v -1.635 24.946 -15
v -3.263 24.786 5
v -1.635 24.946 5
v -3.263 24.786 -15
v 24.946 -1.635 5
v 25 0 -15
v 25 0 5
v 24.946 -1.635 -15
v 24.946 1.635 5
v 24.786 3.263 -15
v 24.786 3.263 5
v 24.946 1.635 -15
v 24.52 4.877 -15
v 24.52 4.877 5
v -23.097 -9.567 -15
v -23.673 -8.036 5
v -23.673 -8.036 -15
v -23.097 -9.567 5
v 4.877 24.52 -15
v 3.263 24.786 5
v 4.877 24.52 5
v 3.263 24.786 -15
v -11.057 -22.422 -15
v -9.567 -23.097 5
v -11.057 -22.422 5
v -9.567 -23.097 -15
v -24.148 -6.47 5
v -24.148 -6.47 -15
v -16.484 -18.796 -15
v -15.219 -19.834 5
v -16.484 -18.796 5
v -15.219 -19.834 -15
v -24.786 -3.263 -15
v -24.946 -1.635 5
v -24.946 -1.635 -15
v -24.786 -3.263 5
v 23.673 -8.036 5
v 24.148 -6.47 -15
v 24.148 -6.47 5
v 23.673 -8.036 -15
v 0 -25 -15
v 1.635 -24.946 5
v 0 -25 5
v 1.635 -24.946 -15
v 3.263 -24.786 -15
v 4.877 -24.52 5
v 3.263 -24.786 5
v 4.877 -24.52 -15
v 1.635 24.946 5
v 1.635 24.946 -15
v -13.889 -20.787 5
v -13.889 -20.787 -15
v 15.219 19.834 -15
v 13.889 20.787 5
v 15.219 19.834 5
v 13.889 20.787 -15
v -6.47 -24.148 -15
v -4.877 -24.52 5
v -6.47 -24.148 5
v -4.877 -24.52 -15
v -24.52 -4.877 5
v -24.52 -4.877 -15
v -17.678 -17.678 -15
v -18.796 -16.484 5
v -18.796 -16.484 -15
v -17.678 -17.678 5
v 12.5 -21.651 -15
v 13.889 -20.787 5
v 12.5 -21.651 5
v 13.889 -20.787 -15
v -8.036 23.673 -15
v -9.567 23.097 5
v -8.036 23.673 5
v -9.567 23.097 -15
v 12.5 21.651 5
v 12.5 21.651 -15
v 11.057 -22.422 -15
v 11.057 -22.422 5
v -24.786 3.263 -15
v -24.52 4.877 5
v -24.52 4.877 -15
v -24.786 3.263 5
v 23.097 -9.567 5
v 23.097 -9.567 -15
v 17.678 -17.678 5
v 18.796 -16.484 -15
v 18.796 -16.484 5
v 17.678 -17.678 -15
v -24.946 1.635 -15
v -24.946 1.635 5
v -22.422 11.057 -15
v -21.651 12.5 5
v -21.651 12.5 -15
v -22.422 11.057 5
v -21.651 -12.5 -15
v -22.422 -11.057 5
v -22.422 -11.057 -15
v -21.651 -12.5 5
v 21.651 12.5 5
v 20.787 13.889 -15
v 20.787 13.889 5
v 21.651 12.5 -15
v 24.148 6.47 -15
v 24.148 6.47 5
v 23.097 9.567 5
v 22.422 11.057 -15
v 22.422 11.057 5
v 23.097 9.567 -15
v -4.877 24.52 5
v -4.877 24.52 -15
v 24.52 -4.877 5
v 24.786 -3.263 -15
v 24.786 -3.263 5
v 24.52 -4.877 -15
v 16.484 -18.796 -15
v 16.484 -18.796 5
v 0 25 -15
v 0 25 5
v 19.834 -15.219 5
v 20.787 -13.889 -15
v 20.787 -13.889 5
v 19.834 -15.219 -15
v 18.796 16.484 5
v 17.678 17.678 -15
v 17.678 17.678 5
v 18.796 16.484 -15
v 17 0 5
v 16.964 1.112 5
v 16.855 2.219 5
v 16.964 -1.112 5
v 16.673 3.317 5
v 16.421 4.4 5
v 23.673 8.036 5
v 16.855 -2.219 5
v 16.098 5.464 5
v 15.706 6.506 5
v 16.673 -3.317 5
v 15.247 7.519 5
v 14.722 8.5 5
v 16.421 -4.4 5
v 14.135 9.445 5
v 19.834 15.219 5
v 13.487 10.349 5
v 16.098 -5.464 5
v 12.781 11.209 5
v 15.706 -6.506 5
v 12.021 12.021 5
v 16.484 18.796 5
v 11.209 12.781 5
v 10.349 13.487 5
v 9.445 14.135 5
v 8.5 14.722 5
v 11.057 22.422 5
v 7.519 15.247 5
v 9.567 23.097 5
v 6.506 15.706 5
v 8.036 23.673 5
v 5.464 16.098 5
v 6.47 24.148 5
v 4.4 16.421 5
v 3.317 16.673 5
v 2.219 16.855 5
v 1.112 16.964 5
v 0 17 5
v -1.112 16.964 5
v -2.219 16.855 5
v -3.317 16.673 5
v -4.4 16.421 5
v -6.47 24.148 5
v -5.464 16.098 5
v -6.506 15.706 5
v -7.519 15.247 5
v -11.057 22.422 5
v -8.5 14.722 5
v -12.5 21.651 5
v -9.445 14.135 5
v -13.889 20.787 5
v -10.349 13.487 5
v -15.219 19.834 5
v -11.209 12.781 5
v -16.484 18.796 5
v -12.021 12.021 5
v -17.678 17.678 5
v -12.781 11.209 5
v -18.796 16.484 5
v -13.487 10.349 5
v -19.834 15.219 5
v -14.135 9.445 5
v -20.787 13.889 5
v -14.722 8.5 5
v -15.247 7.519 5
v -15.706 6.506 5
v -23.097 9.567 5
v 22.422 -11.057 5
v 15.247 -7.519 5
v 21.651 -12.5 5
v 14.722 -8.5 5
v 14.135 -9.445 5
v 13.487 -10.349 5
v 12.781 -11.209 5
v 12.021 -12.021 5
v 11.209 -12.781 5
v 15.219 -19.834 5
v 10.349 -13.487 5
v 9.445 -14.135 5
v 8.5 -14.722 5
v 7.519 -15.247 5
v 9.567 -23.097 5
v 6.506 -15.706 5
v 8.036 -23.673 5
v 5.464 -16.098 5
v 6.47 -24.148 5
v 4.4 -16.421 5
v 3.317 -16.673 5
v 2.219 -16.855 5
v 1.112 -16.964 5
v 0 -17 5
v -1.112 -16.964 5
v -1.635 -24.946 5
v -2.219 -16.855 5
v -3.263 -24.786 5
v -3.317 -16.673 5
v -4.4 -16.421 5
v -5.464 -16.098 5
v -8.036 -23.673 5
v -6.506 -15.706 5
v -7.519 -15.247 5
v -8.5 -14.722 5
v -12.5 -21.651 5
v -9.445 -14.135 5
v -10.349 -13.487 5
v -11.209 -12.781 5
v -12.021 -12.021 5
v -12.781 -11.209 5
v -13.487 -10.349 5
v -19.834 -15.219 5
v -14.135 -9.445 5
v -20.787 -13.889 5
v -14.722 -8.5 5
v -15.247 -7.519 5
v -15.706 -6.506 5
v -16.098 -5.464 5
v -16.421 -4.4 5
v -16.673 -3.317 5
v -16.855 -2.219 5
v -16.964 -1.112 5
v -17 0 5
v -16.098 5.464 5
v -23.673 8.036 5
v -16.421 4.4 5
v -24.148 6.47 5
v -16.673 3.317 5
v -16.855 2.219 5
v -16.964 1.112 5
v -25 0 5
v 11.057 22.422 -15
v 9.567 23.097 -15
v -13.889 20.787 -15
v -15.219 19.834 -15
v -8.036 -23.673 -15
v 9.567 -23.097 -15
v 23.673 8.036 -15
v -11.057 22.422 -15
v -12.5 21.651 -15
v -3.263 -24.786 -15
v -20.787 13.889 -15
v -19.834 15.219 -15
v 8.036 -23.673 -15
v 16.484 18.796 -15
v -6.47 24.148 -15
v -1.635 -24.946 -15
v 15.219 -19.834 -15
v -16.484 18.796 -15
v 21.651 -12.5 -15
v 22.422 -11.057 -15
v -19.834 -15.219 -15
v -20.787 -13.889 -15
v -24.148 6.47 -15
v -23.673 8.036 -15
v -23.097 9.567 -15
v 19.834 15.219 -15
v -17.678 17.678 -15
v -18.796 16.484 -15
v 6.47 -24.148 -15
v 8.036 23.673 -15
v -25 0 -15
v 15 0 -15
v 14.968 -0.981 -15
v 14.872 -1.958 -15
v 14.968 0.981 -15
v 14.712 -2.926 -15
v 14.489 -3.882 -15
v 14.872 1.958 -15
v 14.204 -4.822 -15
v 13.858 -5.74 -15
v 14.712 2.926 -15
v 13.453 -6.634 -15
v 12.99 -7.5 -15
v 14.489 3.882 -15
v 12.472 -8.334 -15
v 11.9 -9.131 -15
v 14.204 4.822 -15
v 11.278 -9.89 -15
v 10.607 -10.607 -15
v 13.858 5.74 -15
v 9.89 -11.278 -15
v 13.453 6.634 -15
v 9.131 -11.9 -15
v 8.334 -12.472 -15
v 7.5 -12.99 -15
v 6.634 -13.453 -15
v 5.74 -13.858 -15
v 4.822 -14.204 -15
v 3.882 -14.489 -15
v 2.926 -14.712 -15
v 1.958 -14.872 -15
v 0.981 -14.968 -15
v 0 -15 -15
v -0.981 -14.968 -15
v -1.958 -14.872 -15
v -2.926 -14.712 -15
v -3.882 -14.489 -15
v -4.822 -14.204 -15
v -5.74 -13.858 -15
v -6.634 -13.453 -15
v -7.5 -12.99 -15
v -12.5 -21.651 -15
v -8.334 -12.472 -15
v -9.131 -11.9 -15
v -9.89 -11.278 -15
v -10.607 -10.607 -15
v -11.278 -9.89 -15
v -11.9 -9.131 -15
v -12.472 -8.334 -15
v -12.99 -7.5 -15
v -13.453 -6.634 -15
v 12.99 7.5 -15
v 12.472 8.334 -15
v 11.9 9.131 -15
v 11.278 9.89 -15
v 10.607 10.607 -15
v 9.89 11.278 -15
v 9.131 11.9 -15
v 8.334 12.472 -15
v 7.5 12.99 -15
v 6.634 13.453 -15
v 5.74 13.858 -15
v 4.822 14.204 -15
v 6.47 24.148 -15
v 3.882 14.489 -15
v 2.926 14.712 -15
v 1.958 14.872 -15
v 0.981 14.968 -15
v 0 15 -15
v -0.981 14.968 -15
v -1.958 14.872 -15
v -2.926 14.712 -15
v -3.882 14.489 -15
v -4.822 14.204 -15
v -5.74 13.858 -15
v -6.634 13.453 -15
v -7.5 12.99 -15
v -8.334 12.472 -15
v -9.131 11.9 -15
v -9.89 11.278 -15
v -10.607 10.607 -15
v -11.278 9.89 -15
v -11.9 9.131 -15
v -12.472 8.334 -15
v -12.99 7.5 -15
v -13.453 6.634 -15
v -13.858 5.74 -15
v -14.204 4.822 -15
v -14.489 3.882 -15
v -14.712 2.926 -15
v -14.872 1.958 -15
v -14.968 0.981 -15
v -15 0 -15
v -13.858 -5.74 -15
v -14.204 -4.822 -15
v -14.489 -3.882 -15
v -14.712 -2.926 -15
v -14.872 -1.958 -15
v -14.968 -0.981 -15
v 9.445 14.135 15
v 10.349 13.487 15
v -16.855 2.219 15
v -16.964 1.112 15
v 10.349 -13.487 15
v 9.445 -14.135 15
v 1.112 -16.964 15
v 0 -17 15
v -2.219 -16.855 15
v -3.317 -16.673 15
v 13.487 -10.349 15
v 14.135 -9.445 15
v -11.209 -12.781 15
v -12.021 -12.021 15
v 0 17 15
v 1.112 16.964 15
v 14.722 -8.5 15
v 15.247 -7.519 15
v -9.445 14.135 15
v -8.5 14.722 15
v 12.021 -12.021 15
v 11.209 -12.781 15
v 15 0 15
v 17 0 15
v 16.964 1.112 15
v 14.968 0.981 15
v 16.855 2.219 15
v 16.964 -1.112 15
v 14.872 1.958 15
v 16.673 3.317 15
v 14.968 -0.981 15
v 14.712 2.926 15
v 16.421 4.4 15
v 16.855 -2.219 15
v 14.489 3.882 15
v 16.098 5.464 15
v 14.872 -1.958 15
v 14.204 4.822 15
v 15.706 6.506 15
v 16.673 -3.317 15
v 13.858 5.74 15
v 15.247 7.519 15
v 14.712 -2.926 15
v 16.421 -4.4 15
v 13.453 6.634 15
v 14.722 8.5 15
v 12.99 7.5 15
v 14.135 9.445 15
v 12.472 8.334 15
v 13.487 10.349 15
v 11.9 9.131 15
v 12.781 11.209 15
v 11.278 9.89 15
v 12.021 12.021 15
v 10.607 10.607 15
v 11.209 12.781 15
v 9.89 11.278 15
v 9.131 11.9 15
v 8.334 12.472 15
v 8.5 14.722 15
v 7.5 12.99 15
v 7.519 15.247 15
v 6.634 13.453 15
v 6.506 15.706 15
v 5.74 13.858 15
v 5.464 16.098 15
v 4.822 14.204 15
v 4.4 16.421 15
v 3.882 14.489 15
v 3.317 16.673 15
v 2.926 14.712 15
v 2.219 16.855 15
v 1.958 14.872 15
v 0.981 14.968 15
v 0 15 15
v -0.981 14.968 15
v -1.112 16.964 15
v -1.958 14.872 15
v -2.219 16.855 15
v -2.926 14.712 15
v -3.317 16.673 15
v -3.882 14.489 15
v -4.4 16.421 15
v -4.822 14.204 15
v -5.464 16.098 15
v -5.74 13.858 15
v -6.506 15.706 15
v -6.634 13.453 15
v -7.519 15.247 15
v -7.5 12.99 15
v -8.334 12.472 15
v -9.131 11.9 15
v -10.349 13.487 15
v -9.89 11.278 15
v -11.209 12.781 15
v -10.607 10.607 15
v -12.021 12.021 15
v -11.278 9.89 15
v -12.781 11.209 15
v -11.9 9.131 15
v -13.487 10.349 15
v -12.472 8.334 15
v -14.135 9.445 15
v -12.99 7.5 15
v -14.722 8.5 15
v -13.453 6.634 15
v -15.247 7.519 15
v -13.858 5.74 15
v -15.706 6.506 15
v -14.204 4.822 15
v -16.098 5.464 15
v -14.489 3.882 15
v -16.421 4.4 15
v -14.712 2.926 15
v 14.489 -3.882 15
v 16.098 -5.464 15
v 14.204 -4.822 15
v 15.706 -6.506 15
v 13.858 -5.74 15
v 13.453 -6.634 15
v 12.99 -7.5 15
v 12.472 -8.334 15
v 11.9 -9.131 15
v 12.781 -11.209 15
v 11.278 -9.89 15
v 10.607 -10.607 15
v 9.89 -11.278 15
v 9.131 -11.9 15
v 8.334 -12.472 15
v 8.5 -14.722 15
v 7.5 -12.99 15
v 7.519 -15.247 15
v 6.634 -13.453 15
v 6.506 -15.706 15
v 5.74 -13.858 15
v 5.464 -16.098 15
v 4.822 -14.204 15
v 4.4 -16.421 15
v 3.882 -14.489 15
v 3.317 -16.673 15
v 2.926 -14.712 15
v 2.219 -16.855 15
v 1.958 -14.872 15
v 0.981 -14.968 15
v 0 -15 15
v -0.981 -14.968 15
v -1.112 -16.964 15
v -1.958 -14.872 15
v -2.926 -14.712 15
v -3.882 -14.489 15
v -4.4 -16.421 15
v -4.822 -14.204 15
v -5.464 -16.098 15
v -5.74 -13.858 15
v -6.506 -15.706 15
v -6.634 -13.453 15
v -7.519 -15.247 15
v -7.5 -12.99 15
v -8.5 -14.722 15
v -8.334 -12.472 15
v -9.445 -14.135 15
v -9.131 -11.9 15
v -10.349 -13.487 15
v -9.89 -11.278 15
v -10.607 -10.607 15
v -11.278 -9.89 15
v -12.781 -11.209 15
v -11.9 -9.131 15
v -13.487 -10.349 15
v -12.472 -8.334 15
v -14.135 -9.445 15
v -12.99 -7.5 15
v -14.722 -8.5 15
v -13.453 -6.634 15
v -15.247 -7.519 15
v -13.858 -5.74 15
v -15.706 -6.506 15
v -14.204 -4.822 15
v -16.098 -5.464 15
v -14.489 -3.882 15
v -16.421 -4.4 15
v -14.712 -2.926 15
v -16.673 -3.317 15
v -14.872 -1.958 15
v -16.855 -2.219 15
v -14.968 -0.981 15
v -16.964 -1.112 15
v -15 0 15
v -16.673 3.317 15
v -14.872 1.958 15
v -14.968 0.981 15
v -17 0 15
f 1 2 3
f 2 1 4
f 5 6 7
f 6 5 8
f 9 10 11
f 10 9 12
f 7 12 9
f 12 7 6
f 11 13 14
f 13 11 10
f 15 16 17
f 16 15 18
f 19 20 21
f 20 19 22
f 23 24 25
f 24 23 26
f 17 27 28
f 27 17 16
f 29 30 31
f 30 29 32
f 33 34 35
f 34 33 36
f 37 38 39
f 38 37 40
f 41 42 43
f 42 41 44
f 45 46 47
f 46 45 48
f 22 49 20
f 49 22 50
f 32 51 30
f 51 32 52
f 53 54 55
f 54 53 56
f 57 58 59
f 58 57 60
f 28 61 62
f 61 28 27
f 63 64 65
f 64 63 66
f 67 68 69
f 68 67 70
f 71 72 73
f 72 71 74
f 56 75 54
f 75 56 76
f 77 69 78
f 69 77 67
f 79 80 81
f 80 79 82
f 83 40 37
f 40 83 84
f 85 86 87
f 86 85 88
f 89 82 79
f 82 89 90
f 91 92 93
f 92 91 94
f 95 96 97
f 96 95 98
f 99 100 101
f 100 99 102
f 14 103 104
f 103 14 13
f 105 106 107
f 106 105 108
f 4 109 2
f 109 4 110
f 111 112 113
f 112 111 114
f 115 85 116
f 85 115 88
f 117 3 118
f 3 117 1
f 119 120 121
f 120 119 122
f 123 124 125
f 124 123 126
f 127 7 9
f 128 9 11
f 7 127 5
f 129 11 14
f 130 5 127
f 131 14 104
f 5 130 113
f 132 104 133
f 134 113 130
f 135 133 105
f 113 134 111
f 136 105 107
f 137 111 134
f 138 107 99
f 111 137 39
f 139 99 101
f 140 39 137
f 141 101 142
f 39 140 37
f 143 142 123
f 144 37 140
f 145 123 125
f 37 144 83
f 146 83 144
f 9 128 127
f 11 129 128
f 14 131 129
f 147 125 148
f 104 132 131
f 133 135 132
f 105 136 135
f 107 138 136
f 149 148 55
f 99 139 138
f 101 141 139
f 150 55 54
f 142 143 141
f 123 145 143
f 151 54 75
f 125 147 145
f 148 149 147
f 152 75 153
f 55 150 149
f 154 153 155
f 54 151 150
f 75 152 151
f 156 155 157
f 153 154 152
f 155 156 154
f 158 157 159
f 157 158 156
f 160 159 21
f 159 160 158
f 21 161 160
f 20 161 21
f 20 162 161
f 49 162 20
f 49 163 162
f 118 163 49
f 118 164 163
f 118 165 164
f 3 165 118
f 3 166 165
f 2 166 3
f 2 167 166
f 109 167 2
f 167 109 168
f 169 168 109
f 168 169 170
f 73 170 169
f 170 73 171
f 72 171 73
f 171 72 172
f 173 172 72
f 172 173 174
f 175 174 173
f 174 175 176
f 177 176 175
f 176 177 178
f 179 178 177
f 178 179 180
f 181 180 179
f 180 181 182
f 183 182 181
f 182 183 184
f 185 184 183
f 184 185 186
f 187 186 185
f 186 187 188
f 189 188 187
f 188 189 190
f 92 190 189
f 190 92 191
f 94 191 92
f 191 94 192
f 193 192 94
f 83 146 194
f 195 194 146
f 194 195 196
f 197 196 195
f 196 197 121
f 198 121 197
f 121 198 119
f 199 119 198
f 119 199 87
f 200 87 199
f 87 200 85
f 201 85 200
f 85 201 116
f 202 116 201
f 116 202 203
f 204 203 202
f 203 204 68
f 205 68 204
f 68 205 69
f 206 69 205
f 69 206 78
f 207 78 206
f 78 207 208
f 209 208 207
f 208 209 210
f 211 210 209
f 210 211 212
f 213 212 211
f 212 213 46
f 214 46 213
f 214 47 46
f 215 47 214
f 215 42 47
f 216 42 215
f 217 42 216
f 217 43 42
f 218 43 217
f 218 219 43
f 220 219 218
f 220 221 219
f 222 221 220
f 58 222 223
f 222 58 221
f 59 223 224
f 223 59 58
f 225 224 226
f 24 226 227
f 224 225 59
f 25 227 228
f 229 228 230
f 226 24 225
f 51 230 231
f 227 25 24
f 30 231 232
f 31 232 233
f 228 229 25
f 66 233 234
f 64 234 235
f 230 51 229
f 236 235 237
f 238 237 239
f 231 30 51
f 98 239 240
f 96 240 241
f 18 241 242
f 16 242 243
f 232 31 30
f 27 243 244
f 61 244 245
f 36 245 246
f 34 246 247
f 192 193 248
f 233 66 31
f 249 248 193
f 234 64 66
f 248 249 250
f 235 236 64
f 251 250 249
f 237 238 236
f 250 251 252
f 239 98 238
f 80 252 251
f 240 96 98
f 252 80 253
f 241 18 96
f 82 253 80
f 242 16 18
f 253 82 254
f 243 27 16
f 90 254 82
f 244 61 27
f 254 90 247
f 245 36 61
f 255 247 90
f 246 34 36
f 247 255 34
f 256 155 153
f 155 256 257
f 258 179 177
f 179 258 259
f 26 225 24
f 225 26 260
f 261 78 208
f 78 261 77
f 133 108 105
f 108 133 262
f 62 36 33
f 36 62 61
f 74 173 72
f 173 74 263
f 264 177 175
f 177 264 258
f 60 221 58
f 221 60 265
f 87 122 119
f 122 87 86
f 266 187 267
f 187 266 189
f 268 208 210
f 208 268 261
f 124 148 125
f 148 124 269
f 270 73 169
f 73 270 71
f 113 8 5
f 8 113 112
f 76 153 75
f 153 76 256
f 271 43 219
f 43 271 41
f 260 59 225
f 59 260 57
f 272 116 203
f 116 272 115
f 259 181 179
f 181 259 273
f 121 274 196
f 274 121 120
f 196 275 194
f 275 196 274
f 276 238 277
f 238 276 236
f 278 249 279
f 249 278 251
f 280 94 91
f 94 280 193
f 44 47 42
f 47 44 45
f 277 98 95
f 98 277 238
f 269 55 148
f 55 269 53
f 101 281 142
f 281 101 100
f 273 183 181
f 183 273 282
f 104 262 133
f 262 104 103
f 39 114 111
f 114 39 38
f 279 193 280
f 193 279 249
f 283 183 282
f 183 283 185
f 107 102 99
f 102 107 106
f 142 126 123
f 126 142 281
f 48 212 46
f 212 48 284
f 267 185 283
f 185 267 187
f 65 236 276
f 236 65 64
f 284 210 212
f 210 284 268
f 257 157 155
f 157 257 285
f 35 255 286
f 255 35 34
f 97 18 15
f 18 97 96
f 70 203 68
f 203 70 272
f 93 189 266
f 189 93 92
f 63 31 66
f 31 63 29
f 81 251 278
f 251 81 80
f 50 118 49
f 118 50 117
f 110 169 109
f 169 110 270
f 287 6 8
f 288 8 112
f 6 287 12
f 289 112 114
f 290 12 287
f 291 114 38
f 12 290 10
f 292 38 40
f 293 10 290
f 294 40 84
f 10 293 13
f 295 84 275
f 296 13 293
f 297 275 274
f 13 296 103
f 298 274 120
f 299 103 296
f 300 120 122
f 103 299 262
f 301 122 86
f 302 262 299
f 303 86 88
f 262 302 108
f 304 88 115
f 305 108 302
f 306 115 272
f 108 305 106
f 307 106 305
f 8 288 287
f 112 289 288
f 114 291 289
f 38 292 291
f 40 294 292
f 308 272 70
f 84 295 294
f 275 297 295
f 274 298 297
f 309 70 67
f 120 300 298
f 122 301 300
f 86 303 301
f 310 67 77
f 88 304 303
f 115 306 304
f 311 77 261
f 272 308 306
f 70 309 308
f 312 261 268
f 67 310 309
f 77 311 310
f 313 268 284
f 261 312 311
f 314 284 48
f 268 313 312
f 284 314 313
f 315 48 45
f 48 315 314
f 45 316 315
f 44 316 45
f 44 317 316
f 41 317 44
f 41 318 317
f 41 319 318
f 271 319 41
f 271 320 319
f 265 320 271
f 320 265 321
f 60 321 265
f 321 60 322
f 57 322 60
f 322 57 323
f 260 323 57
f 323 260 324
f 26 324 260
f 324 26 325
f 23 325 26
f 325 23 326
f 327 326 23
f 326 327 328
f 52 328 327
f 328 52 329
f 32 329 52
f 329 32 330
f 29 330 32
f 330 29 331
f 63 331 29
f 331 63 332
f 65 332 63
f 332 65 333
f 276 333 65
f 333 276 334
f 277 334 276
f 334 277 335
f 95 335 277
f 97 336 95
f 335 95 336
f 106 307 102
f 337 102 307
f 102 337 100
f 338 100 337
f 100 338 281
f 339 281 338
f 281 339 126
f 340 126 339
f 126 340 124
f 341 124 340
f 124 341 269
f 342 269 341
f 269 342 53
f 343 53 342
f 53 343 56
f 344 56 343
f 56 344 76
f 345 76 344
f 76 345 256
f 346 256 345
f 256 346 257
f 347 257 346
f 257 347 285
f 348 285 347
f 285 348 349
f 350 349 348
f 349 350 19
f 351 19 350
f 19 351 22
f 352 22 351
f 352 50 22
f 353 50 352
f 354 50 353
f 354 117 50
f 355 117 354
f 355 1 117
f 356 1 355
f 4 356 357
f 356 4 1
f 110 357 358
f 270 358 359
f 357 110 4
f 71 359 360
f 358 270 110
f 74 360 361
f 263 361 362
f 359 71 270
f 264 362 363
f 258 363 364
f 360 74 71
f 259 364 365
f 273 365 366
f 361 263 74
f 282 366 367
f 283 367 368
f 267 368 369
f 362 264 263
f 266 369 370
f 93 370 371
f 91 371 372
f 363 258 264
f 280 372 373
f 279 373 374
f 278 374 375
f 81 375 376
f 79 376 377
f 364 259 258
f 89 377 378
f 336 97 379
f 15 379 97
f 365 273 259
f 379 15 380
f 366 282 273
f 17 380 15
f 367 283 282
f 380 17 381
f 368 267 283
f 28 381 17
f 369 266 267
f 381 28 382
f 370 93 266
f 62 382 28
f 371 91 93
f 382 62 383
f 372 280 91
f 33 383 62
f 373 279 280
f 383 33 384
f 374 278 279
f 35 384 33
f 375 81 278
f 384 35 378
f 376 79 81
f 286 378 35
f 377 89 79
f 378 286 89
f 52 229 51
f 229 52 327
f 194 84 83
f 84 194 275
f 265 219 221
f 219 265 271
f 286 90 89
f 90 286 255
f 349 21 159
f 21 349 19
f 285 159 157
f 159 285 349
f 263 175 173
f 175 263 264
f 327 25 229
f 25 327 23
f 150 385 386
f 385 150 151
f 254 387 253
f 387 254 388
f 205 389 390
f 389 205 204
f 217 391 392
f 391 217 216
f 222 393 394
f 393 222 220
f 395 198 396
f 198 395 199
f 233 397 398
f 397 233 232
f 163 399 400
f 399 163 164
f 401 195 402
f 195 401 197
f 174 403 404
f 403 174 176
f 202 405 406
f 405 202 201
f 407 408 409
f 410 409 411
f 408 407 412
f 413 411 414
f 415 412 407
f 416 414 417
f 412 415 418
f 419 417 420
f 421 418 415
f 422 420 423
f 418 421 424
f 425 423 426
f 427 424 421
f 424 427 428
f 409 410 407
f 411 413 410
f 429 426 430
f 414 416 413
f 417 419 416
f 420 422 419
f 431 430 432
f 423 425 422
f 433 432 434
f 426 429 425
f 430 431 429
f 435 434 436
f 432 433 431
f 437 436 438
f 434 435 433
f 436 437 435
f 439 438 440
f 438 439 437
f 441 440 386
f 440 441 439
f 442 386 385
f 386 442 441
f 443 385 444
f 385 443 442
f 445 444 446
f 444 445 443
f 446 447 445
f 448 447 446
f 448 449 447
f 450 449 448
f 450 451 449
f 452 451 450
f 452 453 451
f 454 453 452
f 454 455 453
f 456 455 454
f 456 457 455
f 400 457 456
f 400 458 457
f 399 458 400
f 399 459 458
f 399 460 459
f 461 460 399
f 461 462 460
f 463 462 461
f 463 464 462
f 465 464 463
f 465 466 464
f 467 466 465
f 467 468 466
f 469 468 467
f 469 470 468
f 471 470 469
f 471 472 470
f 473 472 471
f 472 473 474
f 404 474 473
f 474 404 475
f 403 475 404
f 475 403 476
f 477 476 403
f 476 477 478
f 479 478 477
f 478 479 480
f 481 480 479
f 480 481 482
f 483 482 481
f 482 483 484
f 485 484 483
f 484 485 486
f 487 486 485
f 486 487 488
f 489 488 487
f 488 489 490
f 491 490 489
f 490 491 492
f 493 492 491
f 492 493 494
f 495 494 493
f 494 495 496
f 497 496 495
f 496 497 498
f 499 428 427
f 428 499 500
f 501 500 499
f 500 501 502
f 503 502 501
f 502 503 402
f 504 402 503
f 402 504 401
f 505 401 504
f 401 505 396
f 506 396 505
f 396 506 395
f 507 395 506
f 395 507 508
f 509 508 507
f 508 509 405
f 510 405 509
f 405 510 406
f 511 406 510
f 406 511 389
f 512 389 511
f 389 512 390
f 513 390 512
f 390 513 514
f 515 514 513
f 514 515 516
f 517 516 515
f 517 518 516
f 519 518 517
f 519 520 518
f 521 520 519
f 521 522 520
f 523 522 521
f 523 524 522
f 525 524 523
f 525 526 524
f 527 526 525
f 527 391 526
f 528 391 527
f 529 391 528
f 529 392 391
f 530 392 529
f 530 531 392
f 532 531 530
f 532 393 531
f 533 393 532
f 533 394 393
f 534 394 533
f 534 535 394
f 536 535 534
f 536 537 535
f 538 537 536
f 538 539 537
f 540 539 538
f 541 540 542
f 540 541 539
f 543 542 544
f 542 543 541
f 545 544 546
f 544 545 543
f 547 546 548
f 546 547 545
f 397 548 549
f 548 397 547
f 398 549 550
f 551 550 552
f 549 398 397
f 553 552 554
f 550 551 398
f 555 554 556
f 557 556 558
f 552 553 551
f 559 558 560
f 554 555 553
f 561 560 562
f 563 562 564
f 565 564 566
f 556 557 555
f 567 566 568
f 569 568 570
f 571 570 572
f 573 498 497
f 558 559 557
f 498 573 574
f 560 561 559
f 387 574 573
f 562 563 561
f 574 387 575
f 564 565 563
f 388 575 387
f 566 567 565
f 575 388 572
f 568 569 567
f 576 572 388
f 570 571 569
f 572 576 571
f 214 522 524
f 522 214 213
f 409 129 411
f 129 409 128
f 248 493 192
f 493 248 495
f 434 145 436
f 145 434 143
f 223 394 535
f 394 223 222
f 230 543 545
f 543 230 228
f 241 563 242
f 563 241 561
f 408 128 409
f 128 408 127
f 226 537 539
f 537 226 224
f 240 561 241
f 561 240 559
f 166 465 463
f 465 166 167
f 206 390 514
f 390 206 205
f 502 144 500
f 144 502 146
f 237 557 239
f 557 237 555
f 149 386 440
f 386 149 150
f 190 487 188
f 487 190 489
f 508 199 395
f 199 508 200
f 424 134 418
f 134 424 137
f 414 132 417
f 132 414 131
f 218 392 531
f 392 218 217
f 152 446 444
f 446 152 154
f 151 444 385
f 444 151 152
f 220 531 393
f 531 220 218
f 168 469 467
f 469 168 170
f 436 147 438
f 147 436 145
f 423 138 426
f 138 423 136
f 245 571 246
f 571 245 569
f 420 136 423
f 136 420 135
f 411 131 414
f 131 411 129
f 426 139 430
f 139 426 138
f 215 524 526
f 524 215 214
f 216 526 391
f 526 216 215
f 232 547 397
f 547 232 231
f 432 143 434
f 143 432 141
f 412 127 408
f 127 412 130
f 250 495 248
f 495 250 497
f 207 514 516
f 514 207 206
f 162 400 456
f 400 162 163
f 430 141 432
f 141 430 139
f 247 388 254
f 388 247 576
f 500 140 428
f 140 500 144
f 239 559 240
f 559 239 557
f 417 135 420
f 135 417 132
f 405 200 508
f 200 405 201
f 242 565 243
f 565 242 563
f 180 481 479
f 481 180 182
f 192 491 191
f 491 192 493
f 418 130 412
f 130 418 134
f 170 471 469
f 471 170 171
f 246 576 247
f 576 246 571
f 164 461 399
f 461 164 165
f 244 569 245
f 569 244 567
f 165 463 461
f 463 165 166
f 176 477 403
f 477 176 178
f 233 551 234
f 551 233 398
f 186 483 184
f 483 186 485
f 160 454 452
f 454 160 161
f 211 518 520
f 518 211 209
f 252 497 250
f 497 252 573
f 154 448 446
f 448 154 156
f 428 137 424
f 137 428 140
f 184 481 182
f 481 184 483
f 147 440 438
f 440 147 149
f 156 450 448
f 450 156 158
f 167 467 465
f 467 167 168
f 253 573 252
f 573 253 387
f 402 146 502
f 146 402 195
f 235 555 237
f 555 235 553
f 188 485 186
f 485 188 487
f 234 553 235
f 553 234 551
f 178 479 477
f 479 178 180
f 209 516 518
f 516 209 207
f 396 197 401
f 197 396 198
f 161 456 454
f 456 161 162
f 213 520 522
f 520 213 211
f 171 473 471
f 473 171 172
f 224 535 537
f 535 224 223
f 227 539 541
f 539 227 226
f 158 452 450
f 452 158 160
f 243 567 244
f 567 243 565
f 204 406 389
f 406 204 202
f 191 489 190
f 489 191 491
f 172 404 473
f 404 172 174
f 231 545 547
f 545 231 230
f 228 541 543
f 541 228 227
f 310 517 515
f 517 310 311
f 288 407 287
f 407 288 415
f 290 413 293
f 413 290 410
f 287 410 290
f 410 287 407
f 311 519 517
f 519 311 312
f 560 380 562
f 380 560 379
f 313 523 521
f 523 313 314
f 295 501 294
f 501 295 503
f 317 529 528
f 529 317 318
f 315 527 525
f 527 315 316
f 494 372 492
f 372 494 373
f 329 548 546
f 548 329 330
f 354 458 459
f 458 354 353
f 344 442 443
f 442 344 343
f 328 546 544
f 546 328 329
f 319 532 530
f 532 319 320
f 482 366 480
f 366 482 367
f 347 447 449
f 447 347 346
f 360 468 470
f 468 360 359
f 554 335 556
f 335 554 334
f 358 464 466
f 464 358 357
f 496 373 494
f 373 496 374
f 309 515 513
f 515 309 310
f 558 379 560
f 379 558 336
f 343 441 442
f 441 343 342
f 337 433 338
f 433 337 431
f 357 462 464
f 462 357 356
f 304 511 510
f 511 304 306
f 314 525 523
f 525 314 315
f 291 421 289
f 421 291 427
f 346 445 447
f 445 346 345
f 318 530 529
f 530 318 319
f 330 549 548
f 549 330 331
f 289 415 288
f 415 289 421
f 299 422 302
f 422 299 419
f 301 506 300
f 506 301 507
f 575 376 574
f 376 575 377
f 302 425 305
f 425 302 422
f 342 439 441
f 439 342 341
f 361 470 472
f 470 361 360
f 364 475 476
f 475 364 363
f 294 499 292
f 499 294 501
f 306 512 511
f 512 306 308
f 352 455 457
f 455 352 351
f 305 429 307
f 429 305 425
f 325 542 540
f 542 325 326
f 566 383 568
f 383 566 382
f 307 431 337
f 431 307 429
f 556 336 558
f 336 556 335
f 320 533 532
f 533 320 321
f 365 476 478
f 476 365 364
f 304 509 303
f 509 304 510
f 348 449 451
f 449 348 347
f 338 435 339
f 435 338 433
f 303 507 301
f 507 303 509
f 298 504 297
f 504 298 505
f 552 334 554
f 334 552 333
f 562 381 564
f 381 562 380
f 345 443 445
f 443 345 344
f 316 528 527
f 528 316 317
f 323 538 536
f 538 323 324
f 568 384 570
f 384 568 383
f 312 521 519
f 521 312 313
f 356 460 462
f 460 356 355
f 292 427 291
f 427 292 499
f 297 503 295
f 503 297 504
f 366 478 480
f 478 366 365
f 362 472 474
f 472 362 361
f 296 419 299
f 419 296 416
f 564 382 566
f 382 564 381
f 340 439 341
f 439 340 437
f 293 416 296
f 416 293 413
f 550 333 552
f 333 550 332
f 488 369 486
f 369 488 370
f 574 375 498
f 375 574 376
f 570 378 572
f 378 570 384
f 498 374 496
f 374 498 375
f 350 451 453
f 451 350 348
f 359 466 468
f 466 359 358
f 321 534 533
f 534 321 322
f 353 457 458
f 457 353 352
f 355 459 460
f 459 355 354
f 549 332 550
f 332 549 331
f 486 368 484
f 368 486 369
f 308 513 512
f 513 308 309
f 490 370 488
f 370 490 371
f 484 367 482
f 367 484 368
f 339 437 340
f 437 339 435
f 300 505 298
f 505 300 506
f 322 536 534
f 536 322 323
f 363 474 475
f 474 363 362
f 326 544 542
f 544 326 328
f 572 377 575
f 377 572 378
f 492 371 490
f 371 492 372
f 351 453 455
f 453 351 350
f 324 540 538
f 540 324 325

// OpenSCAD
$fn = 96;

module lead_screw_nut(bore_d=30, shank_od=34, total_h=30, flange_th=20, flange_od=50) {
    difference() {
        union() {
            // Flange (bottom)
            translate([0,0,-total_h/2])
                cylinder(h=flange_th, d=flange_od);

            // Shank (top)
            translate([0,0,-total_h/2 + flange_th])
                cylinder(h=total_h - flange_th, d=shank_od);
        }

        // Lead-screw bore through entire part
        translate([0,0,-total_h/2 - 0.2])
            cylinder(h=total_h + 0.4, d=bore_d);
    }
}

lead_screw_nut();
